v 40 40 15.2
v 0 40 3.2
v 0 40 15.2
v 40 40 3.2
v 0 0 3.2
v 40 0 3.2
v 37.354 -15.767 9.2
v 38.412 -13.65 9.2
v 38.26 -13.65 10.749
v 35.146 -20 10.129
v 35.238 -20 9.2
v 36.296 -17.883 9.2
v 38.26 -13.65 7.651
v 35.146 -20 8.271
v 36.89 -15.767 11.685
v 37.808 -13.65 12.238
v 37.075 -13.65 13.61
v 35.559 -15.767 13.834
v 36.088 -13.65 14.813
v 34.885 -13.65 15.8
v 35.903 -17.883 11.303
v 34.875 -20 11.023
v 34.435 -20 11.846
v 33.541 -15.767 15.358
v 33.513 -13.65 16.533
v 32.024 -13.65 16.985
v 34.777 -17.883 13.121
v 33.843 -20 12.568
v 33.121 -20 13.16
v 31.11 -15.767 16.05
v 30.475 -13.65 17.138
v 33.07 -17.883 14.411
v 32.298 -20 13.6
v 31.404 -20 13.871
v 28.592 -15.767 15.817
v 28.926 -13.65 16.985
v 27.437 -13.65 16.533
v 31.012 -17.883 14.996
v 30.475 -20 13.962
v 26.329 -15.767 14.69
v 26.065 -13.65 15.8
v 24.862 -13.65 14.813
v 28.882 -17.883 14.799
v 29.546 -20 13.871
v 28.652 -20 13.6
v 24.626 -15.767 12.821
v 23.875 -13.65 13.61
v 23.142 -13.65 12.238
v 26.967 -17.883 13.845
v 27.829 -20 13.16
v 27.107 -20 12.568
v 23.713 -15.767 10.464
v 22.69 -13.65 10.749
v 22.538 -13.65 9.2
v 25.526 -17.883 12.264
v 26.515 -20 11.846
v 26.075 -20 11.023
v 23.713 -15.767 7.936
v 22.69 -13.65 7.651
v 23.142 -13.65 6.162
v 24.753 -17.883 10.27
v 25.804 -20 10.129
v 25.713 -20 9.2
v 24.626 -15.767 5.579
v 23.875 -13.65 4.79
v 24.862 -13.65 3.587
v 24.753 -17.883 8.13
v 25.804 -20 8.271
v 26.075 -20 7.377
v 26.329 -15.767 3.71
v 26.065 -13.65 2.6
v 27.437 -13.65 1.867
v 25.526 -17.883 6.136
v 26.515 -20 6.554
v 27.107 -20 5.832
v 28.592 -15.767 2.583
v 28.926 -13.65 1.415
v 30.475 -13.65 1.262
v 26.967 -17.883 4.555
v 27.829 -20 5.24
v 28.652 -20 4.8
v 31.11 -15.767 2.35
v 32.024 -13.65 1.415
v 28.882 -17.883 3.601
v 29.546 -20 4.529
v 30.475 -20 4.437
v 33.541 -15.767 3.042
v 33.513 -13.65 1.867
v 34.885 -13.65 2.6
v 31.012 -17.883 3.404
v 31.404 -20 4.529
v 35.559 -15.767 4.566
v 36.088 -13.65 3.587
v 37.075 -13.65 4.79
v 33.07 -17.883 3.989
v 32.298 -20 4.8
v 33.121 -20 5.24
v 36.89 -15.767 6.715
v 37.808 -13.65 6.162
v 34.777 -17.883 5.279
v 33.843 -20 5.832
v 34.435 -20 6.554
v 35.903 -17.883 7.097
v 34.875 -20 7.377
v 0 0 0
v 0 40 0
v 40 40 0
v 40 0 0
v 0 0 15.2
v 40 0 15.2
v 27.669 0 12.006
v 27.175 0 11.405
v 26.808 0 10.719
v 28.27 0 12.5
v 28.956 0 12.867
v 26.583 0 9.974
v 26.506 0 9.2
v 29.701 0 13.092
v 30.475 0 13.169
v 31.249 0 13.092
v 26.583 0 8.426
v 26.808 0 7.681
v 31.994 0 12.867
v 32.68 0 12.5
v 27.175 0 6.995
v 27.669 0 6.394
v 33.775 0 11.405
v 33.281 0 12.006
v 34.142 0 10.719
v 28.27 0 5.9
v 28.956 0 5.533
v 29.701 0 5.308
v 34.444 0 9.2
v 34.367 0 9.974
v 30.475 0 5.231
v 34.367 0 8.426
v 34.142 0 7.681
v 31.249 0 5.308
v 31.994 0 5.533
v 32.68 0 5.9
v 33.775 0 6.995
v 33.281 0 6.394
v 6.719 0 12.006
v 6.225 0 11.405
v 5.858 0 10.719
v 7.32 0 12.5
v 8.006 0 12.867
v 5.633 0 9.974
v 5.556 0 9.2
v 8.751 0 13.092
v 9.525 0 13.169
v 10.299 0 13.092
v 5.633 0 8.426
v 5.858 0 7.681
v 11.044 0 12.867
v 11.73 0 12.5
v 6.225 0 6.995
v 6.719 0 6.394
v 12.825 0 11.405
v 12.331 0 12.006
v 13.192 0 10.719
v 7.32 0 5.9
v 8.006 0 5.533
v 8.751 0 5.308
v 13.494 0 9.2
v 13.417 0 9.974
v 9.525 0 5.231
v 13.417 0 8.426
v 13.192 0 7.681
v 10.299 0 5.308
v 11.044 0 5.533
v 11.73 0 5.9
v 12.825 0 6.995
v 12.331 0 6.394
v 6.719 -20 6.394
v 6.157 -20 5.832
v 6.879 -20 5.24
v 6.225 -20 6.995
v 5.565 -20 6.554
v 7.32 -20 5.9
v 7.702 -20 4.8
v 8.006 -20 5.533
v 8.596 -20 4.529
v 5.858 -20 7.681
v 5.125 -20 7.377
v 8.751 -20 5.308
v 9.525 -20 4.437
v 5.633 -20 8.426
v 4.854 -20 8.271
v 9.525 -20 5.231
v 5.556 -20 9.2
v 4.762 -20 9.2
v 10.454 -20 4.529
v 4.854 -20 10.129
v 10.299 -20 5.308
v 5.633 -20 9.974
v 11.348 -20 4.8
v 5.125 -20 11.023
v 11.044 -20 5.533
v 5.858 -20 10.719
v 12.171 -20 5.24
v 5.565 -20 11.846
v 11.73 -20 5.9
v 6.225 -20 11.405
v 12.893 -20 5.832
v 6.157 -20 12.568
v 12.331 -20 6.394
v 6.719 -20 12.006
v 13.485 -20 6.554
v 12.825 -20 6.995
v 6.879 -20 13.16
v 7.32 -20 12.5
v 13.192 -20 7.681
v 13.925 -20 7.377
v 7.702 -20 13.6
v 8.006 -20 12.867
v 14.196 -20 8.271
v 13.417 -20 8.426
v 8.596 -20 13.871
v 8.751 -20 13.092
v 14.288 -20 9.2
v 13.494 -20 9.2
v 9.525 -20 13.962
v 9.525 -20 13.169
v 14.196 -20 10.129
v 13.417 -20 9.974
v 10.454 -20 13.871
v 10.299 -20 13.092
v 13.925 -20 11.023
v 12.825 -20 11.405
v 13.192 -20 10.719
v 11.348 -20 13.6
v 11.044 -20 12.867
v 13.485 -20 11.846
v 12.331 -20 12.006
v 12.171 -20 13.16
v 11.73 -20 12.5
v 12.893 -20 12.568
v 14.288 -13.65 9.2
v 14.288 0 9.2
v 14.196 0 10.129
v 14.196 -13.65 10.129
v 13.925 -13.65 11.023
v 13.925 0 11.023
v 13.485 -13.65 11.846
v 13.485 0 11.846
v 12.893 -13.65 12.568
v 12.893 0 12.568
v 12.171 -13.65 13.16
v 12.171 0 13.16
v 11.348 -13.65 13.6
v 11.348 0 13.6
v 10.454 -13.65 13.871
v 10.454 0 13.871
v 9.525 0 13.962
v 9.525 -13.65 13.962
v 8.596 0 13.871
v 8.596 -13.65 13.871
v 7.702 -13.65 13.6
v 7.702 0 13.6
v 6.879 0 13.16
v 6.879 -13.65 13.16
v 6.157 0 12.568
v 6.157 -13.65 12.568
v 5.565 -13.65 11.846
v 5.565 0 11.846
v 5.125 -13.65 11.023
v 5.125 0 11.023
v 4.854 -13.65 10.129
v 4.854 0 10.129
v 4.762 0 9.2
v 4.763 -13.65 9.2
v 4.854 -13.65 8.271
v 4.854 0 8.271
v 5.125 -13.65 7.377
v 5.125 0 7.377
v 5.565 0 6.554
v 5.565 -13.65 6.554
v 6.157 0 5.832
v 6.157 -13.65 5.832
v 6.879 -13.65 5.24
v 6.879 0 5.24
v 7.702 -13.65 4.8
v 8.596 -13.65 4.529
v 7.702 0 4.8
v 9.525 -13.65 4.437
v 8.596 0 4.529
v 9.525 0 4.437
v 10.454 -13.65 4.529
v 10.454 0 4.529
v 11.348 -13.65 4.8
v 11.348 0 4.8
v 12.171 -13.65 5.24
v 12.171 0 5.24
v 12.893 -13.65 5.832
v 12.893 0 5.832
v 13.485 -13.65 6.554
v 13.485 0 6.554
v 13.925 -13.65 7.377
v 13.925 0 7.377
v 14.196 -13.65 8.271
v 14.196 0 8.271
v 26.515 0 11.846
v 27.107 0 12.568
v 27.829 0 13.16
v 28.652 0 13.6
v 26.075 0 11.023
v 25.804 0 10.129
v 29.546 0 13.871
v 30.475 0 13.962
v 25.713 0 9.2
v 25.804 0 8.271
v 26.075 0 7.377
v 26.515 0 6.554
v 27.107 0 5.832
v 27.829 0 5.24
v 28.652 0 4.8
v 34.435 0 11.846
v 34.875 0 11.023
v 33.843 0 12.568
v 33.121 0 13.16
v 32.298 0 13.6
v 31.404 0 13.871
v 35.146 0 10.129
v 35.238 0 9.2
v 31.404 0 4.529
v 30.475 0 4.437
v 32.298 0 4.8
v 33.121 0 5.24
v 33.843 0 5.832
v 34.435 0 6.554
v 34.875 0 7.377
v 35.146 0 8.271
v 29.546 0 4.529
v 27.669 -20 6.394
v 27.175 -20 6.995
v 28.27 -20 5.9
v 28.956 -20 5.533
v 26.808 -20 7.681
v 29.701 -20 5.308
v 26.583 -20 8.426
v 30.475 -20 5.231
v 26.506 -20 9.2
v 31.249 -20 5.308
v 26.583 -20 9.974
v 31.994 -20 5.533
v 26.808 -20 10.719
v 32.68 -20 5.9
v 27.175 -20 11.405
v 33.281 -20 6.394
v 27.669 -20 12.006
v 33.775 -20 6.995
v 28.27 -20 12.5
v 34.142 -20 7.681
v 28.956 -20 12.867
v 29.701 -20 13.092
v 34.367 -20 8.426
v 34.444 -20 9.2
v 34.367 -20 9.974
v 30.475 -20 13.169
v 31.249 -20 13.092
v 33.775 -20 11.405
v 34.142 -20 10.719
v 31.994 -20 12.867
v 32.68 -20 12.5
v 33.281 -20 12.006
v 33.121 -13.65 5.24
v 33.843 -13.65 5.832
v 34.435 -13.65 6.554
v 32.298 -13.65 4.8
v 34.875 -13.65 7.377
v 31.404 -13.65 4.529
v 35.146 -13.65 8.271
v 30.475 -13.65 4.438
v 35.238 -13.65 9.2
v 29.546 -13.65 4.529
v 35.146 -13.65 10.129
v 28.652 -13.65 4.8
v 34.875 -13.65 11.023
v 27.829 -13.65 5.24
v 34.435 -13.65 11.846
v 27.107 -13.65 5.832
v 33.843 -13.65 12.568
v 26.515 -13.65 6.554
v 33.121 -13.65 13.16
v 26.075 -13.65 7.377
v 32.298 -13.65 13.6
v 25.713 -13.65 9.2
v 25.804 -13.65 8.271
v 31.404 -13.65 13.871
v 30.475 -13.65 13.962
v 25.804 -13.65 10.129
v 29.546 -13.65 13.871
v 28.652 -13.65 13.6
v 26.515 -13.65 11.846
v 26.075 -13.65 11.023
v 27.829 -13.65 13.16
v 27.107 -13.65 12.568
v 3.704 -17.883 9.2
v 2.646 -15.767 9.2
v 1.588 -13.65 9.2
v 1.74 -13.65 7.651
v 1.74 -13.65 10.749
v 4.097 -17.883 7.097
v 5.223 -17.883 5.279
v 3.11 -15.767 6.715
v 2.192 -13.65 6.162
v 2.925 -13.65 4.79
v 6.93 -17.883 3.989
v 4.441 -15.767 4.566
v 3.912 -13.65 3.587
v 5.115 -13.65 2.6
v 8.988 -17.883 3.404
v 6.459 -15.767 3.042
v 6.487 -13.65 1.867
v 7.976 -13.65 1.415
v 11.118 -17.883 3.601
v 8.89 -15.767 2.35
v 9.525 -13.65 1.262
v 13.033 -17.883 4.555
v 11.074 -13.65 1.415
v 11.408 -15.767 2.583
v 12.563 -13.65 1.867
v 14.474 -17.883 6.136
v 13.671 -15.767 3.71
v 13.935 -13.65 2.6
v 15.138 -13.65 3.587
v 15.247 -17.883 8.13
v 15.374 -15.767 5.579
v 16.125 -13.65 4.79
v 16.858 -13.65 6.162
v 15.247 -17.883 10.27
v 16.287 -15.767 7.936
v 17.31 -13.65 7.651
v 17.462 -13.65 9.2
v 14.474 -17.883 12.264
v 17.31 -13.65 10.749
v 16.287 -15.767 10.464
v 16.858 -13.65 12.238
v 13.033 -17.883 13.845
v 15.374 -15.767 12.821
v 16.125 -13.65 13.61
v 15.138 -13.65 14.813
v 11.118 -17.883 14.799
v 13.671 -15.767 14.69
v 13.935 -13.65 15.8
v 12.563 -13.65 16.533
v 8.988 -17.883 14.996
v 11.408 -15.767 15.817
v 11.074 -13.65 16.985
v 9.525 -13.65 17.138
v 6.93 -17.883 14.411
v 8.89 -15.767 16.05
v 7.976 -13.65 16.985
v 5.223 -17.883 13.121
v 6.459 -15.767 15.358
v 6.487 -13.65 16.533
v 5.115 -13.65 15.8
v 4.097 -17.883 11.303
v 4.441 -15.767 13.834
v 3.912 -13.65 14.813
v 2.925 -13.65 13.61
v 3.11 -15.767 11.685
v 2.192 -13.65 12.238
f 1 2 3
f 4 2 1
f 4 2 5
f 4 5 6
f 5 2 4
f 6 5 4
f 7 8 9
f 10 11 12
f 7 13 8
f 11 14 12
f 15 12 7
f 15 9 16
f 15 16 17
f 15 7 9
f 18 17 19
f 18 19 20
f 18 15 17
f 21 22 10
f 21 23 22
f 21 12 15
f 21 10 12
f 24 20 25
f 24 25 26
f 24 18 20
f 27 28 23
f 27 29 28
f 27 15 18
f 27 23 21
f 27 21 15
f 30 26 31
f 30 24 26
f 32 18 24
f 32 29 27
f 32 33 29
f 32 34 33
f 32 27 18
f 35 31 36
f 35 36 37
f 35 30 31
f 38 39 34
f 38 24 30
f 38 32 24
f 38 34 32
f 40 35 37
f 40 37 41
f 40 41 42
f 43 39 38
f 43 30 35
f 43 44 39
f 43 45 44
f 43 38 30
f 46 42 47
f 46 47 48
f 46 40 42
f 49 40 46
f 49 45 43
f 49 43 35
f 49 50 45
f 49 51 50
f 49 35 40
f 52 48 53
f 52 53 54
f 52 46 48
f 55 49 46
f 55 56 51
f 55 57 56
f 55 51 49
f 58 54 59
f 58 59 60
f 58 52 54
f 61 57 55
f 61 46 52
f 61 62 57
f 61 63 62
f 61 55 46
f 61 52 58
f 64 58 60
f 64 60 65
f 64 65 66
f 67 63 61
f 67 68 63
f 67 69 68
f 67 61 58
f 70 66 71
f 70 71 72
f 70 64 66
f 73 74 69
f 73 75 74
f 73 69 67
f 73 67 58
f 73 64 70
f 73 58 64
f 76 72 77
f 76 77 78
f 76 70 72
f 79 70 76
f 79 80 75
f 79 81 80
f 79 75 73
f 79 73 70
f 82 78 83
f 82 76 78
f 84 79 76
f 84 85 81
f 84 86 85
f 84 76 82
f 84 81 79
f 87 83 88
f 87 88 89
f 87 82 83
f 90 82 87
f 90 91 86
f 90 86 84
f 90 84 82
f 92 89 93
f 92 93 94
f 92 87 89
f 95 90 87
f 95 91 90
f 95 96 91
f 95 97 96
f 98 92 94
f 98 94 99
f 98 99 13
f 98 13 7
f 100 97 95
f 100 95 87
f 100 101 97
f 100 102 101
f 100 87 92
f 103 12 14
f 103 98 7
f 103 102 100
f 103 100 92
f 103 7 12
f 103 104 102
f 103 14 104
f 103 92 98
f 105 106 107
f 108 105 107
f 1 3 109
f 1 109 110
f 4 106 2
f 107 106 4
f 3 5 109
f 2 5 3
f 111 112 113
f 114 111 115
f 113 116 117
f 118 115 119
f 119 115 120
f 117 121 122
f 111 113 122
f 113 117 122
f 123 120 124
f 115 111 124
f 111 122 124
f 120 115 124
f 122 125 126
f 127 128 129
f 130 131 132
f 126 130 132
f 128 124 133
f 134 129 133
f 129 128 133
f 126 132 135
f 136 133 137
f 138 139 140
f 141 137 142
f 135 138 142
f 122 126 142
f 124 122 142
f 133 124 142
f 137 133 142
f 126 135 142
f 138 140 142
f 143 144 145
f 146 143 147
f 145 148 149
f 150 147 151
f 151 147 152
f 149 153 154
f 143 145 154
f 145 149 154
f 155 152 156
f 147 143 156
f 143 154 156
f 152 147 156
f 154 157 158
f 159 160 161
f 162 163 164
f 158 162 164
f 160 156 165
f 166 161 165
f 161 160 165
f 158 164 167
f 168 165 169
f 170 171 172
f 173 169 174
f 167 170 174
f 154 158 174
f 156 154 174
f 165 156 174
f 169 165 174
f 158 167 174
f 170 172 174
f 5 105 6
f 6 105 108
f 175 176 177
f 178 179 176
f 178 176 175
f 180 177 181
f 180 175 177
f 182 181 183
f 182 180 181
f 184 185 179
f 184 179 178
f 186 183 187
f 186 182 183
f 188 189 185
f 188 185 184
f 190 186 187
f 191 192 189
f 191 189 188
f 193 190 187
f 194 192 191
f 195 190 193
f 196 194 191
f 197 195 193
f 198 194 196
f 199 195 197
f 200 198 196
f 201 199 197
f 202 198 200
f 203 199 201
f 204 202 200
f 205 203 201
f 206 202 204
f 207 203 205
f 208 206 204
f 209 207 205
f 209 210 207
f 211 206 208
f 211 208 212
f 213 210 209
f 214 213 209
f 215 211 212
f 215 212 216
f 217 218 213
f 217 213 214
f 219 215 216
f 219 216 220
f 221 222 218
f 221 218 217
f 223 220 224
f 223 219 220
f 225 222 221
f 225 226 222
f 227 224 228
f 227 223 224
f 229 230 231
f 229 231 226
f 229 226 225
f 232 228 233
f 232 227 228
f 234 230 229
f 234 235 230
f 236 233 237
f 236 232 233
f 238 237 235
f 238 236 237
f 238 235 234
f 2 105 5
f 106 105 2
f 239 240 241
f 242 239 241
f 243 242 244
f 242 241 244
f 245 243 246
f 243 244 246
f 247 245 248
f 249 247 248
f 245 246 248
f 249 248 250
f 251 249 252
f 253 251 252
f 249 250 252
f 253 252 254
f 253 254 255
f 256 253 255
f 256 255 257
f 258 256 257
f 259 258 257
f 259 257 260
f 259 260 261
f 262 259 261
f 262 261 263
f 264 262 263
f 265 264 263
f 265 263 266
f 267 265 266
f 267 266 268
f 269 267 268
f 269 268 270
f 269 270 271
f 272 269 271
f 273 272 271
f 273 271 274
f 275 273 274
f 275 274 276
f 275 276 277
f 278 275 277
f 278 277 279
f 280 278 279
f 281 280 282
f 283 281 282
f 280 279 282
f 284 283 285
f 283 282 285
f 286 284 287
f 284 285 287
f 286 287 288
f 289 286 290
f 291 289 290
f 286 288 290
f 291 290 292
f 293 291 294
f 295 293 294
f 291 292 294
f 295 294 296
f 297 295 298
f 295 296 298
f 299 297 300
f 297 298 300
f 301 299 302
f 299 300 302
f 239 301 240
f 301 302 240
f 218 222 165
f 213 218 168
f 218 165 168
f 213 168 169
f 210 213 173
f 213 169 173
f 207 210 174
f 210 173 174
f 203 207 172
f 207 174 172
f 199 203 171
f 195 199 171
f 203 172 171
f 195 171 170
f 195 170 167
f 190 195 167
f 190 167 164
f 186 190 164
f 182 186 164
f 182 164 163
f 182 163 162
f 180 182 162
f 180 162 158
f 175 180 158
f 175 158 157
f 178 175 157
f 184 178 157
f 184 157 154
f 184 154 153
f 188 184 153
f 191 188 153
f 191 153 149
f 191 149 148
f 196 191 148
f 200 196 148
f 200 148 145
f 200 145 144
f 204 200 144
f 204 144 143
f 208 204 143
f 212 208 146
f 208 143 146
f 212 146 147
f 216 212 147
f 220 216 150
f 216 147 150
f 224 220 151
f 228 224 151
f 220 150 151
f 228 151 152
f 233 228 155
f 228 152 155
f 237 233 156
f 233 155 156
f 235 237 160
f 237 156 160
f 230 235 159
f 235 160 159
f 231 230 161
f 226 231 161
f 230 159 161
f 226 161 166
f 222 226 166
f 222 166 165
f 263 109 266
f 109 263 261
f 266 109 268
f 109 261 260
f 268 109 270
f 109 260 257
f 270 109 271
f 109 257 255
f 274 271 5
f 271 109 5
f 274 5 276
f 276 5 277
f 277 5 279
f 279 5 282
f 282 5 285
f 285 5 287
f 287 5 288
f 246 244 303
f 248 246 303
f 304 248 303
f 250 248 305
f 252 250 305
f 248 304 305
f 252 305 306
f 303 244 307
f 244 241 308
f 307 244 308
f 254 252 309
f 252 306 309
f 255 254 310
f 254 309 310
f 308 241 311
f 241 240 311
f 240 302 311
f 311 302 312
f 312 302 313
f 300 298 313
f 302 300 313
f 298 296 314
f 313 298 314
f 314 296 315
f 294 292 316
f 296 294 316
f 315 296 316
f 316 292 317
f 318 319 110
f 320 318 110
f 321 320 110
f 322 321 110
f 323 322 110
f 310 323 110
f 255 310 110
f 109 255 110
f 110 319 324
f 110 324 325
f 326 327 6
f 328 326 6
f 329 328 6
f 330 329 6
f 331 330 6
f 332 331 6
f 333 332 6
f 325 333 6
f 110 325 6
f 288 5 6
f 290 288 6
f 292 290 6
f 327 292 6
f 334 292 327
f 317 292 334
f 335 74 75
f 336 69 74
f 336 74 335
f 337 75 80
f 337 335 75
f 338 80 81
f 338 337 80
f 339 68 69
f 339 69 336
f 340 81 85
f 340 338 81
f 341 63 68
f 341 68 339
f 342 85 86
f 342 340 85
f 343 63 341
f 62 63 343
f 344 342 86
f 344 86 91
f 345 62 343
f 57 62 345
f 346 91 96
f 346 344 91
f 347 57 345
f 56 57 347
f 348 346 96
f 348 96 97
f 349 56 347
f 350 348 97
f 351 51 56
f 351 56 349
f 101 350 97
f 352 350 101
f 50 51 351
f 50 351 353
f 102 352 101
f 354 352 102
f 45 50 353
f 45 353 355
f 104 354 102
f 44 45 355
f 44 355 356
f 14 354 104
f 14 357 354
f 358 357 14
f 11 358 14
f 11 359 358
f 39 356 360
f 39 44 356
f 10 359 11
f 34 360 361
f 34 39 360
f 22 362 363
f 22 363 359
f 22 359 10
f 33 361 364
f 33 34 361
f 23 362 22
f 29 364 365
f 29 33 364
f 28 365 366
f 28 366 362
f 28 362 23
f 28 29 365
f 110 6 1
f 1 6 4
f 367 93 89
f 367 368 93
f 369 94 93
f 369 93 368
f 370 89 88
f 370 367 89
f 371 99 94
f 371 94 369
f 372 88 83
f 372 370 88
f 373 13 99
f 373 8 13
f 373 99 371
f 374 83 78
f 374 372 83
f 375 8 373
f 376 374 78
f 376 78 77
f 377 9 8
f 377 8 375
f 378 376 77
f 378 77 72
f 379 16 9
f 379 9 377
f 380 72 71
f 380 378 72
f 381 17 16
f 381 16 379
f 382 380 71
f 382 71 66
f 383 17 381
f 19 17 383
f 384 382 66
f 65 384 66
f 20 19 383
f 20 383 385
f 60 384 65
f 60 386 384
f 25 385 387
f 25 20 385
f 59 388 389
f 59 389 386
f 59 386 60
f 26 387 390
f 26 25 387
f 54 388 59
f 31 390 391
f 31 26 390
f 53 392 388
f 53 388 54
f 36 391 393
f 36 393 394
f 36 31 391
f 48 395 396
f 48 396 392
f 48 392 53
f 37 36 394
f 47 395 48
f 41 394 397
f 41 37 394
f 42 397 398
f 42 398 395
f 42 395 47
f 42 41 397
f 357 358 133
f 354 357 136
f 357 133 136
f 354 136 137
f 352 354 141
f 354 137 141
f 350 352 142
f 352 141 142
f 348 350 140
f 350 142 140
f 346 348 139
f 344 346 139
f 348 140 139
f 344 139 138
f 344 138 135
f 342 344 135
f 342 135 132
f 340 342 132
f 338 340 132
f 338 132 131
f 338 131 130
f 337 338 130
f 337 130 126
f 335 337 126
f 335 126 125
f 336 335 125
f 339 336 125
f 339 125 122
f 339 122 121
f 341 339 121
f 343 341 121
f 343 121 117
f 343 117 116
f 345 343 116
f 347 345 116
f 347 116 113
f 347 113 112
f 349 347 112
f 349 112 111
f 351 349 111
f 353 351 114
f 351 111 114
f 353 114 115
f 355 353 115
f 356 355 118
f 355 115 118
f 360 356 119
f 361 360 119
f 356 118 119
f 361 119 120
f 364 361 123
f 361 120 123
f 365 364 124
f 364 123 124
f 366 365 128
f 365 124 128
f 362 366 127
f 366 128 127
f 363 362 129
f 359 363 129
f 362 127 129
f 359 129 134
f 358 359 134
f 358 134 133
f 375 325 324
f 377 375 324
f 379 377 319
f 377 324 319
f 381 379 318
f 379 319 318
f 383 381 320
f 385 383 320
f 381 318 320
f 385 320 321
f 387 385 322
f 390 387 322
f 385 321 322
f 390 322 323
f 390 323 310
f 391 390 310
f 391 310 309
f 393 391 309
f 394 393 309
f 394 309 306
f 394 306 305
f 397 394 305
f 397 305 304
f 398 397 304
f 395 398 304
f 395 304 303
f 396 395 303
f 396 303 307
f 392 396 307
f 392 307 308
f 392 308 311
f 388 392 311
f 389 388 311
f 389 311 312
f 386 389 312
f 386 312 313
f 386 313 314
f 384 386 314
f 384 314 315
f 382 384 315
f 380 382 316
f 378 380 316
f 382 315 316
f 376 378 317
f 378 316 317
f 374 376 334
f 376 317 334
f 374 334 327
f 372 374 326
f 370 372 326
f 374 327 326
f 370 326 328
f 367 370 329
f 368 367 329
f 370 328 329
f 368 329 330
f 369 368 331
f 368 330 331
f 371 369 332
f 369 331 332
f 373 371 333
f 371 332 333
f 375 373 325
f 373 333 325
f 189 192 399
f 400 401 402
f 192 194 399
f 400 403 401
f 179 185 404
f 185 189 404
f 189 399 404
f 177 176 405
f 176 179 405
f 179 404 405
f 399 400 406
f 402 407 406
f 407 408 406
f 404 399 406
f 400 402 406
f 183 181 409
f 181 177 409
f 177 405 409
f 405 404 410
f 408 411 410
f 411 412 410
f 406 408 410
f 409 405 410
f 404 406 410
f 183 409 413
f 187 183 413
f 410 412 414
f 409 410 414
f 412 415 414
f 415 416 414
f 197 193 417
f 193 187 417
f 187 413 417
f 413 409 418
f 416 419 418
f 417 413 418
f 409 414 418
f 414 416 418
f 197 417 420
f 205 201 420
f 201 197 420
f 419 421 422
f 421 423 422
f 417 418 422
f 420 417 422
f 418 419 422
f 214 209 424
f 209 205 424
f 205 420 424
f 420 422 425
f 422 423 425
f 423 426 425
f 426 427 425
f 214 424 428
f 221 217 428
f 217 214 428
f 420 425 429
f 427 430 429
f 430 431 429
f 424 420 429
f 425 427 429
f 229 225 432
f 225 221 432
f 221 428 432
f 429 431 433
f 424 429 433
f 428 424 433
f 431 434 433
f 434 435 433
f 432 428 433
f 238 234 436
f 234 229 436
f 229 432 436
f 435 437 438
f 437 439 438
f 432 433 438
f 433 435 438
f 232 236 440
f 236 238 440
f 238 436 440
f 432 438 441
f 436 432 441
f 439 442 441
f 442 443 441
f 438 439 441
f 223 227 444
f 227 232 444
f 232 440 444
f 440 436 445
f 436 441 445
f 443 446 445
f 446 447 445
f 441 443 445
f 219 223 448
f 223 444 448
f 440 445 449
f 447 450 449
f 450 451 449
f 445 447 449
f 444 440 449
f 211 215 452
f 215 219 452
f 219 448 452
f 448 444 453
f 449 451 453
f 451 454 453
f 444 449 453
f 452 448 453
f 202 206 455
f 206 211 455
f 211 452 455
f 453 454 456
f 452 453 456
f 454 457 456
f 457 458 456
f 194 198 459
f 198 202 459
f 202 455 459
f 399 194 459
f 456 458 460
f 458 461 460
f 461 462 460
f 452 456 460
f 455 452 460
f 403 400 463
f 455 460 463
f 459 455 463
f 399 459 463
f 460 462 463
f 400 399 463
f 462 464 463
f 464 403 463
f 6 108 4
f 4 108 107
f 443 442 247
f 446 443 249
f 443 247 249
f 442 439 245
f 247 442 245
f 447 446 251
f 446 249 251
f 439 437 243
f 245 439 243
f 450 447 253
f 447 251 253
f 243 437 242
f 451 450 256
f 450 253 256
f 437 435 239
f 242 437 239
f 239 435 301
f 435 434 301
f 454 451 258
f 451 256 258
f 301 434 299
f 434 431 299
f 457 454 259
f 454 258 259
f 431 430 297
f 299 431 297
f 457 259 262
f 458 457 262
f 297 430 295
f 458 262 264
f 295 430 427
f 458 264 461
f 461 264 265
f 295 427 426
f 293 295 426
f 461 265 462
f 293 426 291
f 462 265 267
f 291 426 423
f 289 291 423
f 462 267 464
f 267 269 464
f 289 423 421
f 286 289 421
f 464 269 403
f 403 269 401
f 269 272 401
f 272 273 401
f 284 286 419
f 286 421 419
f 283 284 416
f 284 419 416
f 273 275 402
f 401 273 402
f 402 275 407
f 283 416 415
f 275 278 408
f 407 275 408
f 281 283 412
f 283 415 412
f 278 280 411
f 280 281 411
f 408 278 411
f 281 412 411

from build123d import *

# Parameters (mm, degrees)
F0_W      = 40
F0_H      = 40
F1_DEPTH  = 3.2
F2_W      = 40
F2_H      = 40
F3_DEPTH  = 12
F4_R      = 4.7625
F5_DEPTH  = 20
F13_D     = 7.9375
F13_DEPTH = 20.001


with BuildPart() as f1:
    # F0 (on Top) → F1 (new body)
    with BuildSketch(Plane.XY):
        with Locations((20, 20)):
            Rectangle(F0_W, F0_H)
    extrude(amount=F1_DEPTH)


with BuildPart() as f3:
    # F2 (on face) → F3 (new body)
    with BuildSketch(Plane.XY.offset(3.2)):
        with Locations((20, 20)):
            Rectangle(F2_W, F2_H)
    extrude(amount=F3_DEPTH)

    # F4 (on face) → F5 (join)
    with BuildSketch(Plane.XZ):
        with Locations((9.525, 9.2)):
            Circle(F4_R)
        with Locations((30.475, 9.2)):
            Circle(F4_R)
    extrude(amount=F5_DEPTH)

    # F10 (on 3pt) → F11 (revolve)
    with BuildSketch(Plane(origin=(0, 0, 9.2), x_dir=(1, 0, 0), z_dir=(0, 0, -1))):
        Polygon((4.7625, 13.65), (4.7625, 20), (1.5875, 13.65), align=None)
    revolve(axis=Axis((9.525, -20, 9.2), (0, -1, 0)))

    # F10 (on 3pt) → F12 (revolve)
    with BuildSketch(Plane(origin=(0, 0, 9.2), x_dir=(1, 0, 0), z_dir=(0, 0, -1))):
        Polygon((38.4125, 13.65), (35.2375, 20), (35.2375, 13.65), align=None)
    revolve(axis=Axis((30.475, -20, 9.2), (0, -1, 0)))

    # F13 (through all, one way)
    with BuildSketch(Plane(origin=(0, 0, 0), x_dir=(1, 0, 0), z_dir=(0, 1, 0))):
        with Locations((9.525, -9.2), (30.475, -9.2)):
            Circle(F13_D / 2)
    extrude(amount=-F13_DEPTH, mode=Mode.SUBTRACT)


solid = Compound([f1.part, f3.part])
